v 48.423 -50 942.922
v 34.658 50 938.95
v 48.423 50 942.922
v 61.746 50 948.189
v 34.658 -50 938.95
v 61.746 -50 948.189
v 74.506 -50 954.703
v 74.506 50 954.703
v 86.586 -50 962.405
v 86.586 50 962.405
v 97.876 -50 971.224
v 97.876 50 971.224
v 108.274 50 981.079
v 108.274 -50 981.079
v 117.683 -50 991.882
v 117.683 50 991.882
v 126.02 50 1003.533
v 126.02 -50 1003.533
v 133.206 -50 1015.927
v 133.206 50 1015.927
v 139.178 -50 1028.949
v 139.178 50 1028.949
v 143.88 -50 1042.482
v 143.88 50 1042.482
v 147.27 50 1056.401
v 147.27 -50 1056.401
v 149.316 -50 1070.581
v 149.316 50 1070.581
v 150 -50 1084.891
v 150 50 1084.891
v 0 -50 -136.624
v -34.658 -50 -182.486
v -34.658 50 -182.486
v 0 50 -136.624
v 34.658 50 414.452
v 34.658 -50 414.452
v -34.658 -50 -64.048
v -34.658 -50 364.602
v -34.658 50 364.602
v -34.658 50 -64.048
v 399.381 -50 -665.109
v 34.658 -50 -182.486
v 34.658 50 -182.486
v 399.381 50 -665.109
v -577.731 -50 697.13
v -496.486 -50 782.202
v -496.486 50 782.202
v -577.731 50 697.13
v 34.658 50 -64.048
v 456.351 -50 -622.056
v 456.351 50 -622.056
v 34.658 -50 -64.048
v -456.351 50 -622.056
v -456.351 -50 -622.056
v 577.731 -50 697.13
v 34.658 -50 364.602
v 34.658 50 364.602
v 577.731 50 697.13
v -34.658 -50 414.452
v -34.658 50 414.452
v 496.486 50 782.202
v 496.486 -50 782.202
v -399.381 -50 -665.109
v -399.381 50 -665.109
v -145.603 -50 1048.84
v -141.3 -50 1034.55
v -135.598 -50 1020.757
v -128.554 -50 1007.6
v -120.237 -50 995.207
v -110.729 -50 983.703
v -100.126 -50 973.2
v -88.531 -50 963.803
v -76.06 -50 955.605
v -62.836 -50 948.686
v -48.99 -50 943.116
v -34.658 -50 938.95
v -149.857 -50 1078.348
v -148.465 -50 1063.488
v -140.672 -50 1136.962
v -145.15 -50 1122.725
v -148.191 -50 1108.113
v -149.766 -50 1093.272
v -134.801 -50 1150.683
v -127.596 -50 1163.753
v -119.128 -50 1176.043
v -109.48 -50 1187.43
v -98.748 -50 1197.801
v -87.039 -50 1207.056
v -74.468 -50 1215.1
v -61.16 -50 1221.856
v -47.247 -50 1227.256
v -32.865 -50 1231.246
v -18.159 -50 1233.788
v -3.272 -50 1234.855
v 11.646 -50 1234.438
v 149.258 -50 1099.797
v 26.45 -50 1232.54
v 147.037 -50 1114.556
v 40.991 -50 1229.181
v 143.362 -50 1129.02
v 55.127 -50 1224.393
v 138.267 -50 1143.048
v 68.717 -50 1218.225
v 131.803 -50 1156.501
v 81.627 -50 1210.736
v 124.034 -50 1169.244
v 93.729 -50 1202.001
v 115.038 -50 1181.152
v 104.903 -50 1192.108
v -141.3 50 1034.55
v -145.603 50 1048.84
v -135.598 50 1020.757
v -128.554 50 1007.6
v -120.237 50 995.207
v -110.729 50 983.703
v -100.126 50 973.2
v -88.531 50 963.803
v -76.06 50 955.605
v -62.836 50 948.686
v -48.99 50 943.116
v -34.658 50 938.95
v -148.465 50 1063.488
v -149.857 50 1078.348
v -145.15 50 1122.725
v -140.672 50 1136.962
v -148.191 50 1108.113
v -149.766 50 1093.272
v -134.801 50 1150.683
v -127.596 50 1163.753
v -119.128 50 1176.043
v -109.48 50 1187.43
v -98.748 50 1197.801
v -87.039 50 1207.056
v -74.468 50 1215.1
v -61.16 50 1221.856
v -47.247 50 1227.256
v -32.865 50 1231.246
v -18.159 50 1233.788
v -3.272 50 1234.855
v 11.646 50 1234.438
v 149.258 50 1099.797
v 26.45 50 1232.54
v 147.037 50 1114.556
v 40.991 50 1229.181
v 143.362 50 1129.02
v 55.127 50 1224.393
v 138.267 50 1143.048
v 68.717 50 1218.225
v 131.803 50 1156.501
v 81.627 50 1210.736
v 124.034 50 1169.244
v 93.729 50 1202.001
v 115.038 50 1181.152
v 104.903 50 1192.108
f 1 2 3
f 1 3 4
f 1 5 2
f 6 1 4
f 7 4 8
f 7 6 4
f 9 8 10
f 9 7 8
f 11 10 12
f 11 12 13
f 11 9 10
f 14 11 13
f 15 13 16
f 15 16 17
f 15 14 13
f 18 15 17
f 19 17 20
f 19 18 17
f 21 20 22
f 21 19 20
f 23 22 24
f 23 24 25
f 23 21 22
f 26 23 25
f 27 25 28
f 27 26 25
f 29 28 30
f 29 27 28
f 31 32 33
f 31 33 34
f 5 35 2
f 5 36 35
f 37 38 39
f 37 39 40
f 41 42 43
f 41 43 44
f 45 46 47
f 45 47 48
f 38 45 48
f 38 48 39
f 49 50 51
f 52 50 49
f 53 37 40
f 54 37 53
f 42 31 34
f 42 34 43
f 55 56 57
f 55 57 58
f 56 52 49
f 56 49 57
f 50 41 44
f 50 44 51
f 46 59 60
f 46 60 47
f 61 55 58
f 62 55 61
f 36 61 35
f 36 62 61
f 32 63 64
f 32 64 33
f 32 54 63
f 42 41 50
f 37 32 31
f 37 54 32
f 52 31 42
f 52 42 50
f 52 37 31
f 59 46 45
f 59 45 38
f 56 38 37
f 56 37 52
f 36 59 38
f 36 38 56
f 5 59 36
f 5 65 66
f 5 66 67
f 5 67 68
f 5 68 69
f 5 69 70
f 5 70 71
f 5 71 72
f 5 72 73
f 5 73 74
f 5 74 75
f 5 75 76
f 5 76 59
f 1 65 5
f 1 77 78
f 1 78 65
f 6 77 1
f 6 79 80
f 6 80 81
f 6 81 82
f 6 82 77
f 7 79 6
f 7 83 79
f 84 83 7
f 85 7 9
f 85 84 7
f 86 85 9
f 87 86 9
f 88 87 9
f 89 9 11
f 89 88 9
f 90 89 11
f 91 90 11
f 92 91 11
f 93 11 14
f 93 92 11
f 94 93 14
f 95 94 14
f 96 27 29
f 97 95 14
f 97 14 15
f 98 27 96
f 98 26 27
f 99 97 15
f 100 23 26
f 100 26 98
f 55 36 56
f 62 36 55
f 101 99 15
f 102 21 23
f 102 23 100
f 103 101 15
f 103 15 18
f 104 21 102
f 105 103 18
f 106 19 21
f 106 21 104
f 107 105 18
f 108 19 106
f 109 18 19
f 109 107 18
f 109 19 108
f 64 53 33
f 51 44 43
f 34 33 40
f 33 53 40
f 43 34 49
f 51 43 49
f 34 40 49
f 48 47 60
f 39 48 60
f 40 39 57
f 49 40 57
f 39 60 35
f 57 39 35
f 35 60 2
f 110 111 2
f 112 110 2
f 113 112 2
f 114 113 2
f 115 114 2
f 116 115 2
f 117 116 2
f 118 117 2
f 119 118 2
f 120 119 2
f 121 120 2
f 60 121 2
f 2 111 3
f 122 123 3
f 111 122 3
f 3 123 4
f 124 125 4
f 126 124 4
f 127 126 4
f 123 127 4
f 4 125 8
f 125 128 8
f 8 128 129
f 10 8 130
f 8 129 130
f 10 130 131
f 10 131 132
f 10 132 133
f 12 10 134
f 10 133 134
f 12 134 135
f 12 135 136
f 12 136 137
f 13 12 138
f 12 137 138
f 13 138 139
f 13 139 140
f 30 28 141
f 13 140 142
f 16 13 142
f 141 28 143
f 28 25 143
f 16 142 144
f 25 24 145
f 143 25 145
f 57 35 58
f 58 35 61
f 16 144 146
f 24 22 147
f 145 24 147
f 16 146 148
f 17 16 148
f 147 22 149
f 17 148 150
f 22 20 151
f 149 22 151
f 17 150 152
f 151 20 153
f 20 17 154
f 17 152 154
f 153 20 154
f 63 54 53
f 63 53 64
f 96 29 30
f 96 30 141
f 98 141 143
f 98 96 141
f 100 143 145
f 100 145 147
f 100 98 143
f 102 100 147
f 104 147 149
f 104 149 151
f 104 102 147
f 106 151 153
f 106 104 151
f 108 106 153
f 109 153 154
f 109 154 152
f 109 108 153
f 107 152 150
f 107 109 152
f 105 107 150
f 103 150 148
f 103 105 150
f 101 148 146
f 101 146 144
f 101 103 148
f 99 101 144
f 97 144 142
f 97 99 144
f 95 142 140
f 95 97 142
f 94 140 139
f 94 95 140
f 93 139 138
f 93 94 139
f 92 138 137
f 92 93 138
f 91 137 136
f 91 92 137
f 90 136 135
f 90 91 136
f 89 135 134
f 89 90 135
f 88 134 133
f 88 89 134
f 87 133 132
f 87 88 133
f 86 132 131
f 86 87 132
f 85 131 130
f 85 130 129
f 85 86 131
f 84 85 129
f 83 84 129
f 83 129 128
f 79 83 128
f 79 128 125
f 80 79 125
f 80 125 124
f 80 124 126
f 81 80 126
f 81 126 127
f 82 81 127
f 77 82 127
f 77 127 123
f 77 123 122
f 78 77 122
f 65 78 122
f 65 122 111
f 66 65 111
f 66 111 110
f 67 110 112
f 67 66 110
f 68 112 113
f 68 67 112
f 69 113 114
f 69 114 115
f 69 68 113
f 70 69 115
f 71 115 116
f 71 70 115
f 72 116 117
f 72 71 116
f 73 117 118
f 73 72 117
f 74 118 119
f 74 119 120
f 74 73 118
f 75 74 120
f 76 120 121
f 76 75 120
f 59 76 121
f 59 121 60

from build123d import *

# Parameters (mm, degrees)
F1_DEPTH = 50


with BuildPart() as f1:
    # F0 (on Front) → F1 (new body, symmetric)
    with BuildSketch(Plane.XZ):
        with BuildLine():
            ThreePointArc((34.65832, 938.949756), (117.683363, 991.882101), (150, 1084.890842))
            ThreePointArc((150, 1084.890842), (-93.008741, 1202.574206), (-34.65832, 938.949756))
            ThreePointArc((-34.65832, 938.949756), (0, 934.890842), (34.65832, 938.949756))
        make_face()
        with BuildLine():
            ThreePointArc((34.65832, 938.949756), (0, 934.890842), (-34.65832, 938.949756))
            Line((-34.65832, 938.949756), (-34.65832, 414.451611))
            Line((-34.65832, 414.451611), (-496.485632, 782.202331))
            Line((-496.485632, 782.202331), (-577.730775, 697.129786))
            Line((-577.730775, 697.129786), (-34.65832, 364.602458))
            Line((-34.65832, 364.602458), (-34.65832, -64.047714))
            Line((-34.65832, -64.047714), (-456.351271, -622.056438))
            Line((-456.351271, -622.056438), (-399.381399, -665.109158))
            Line((-399.381399, -665.109158), (-34.65832, -182.486293))
            Line((-34.65832, -182.486293), (0, -136.624381))
            Line((0, -136.624381), (34.65832, -182.486293))
            Line((34.65832, -182.486293), (399.381399, -665.109158))
            Line((399.381399, -665.109158), (456.351271, -622.056438))
            Line((456.351271, -622.056438), (34.65832, -64.047714))
            Line((34.65832, -64.047714), (34.65832, 364.602458))
            Line((34.65832, 364.602458), (577.730775, 697.129786))
            Line((577.730775, 697.129786), (496.485632, 782.202331))
            Line((496.485632, 782.202331), (34.65832, 414.451611))
            Line((34.65832, 414.451611), (34.65832, 938.949756))
        make_face()
    extrude(amount=F1_DEPTH, both=True)


solid = f1.part
